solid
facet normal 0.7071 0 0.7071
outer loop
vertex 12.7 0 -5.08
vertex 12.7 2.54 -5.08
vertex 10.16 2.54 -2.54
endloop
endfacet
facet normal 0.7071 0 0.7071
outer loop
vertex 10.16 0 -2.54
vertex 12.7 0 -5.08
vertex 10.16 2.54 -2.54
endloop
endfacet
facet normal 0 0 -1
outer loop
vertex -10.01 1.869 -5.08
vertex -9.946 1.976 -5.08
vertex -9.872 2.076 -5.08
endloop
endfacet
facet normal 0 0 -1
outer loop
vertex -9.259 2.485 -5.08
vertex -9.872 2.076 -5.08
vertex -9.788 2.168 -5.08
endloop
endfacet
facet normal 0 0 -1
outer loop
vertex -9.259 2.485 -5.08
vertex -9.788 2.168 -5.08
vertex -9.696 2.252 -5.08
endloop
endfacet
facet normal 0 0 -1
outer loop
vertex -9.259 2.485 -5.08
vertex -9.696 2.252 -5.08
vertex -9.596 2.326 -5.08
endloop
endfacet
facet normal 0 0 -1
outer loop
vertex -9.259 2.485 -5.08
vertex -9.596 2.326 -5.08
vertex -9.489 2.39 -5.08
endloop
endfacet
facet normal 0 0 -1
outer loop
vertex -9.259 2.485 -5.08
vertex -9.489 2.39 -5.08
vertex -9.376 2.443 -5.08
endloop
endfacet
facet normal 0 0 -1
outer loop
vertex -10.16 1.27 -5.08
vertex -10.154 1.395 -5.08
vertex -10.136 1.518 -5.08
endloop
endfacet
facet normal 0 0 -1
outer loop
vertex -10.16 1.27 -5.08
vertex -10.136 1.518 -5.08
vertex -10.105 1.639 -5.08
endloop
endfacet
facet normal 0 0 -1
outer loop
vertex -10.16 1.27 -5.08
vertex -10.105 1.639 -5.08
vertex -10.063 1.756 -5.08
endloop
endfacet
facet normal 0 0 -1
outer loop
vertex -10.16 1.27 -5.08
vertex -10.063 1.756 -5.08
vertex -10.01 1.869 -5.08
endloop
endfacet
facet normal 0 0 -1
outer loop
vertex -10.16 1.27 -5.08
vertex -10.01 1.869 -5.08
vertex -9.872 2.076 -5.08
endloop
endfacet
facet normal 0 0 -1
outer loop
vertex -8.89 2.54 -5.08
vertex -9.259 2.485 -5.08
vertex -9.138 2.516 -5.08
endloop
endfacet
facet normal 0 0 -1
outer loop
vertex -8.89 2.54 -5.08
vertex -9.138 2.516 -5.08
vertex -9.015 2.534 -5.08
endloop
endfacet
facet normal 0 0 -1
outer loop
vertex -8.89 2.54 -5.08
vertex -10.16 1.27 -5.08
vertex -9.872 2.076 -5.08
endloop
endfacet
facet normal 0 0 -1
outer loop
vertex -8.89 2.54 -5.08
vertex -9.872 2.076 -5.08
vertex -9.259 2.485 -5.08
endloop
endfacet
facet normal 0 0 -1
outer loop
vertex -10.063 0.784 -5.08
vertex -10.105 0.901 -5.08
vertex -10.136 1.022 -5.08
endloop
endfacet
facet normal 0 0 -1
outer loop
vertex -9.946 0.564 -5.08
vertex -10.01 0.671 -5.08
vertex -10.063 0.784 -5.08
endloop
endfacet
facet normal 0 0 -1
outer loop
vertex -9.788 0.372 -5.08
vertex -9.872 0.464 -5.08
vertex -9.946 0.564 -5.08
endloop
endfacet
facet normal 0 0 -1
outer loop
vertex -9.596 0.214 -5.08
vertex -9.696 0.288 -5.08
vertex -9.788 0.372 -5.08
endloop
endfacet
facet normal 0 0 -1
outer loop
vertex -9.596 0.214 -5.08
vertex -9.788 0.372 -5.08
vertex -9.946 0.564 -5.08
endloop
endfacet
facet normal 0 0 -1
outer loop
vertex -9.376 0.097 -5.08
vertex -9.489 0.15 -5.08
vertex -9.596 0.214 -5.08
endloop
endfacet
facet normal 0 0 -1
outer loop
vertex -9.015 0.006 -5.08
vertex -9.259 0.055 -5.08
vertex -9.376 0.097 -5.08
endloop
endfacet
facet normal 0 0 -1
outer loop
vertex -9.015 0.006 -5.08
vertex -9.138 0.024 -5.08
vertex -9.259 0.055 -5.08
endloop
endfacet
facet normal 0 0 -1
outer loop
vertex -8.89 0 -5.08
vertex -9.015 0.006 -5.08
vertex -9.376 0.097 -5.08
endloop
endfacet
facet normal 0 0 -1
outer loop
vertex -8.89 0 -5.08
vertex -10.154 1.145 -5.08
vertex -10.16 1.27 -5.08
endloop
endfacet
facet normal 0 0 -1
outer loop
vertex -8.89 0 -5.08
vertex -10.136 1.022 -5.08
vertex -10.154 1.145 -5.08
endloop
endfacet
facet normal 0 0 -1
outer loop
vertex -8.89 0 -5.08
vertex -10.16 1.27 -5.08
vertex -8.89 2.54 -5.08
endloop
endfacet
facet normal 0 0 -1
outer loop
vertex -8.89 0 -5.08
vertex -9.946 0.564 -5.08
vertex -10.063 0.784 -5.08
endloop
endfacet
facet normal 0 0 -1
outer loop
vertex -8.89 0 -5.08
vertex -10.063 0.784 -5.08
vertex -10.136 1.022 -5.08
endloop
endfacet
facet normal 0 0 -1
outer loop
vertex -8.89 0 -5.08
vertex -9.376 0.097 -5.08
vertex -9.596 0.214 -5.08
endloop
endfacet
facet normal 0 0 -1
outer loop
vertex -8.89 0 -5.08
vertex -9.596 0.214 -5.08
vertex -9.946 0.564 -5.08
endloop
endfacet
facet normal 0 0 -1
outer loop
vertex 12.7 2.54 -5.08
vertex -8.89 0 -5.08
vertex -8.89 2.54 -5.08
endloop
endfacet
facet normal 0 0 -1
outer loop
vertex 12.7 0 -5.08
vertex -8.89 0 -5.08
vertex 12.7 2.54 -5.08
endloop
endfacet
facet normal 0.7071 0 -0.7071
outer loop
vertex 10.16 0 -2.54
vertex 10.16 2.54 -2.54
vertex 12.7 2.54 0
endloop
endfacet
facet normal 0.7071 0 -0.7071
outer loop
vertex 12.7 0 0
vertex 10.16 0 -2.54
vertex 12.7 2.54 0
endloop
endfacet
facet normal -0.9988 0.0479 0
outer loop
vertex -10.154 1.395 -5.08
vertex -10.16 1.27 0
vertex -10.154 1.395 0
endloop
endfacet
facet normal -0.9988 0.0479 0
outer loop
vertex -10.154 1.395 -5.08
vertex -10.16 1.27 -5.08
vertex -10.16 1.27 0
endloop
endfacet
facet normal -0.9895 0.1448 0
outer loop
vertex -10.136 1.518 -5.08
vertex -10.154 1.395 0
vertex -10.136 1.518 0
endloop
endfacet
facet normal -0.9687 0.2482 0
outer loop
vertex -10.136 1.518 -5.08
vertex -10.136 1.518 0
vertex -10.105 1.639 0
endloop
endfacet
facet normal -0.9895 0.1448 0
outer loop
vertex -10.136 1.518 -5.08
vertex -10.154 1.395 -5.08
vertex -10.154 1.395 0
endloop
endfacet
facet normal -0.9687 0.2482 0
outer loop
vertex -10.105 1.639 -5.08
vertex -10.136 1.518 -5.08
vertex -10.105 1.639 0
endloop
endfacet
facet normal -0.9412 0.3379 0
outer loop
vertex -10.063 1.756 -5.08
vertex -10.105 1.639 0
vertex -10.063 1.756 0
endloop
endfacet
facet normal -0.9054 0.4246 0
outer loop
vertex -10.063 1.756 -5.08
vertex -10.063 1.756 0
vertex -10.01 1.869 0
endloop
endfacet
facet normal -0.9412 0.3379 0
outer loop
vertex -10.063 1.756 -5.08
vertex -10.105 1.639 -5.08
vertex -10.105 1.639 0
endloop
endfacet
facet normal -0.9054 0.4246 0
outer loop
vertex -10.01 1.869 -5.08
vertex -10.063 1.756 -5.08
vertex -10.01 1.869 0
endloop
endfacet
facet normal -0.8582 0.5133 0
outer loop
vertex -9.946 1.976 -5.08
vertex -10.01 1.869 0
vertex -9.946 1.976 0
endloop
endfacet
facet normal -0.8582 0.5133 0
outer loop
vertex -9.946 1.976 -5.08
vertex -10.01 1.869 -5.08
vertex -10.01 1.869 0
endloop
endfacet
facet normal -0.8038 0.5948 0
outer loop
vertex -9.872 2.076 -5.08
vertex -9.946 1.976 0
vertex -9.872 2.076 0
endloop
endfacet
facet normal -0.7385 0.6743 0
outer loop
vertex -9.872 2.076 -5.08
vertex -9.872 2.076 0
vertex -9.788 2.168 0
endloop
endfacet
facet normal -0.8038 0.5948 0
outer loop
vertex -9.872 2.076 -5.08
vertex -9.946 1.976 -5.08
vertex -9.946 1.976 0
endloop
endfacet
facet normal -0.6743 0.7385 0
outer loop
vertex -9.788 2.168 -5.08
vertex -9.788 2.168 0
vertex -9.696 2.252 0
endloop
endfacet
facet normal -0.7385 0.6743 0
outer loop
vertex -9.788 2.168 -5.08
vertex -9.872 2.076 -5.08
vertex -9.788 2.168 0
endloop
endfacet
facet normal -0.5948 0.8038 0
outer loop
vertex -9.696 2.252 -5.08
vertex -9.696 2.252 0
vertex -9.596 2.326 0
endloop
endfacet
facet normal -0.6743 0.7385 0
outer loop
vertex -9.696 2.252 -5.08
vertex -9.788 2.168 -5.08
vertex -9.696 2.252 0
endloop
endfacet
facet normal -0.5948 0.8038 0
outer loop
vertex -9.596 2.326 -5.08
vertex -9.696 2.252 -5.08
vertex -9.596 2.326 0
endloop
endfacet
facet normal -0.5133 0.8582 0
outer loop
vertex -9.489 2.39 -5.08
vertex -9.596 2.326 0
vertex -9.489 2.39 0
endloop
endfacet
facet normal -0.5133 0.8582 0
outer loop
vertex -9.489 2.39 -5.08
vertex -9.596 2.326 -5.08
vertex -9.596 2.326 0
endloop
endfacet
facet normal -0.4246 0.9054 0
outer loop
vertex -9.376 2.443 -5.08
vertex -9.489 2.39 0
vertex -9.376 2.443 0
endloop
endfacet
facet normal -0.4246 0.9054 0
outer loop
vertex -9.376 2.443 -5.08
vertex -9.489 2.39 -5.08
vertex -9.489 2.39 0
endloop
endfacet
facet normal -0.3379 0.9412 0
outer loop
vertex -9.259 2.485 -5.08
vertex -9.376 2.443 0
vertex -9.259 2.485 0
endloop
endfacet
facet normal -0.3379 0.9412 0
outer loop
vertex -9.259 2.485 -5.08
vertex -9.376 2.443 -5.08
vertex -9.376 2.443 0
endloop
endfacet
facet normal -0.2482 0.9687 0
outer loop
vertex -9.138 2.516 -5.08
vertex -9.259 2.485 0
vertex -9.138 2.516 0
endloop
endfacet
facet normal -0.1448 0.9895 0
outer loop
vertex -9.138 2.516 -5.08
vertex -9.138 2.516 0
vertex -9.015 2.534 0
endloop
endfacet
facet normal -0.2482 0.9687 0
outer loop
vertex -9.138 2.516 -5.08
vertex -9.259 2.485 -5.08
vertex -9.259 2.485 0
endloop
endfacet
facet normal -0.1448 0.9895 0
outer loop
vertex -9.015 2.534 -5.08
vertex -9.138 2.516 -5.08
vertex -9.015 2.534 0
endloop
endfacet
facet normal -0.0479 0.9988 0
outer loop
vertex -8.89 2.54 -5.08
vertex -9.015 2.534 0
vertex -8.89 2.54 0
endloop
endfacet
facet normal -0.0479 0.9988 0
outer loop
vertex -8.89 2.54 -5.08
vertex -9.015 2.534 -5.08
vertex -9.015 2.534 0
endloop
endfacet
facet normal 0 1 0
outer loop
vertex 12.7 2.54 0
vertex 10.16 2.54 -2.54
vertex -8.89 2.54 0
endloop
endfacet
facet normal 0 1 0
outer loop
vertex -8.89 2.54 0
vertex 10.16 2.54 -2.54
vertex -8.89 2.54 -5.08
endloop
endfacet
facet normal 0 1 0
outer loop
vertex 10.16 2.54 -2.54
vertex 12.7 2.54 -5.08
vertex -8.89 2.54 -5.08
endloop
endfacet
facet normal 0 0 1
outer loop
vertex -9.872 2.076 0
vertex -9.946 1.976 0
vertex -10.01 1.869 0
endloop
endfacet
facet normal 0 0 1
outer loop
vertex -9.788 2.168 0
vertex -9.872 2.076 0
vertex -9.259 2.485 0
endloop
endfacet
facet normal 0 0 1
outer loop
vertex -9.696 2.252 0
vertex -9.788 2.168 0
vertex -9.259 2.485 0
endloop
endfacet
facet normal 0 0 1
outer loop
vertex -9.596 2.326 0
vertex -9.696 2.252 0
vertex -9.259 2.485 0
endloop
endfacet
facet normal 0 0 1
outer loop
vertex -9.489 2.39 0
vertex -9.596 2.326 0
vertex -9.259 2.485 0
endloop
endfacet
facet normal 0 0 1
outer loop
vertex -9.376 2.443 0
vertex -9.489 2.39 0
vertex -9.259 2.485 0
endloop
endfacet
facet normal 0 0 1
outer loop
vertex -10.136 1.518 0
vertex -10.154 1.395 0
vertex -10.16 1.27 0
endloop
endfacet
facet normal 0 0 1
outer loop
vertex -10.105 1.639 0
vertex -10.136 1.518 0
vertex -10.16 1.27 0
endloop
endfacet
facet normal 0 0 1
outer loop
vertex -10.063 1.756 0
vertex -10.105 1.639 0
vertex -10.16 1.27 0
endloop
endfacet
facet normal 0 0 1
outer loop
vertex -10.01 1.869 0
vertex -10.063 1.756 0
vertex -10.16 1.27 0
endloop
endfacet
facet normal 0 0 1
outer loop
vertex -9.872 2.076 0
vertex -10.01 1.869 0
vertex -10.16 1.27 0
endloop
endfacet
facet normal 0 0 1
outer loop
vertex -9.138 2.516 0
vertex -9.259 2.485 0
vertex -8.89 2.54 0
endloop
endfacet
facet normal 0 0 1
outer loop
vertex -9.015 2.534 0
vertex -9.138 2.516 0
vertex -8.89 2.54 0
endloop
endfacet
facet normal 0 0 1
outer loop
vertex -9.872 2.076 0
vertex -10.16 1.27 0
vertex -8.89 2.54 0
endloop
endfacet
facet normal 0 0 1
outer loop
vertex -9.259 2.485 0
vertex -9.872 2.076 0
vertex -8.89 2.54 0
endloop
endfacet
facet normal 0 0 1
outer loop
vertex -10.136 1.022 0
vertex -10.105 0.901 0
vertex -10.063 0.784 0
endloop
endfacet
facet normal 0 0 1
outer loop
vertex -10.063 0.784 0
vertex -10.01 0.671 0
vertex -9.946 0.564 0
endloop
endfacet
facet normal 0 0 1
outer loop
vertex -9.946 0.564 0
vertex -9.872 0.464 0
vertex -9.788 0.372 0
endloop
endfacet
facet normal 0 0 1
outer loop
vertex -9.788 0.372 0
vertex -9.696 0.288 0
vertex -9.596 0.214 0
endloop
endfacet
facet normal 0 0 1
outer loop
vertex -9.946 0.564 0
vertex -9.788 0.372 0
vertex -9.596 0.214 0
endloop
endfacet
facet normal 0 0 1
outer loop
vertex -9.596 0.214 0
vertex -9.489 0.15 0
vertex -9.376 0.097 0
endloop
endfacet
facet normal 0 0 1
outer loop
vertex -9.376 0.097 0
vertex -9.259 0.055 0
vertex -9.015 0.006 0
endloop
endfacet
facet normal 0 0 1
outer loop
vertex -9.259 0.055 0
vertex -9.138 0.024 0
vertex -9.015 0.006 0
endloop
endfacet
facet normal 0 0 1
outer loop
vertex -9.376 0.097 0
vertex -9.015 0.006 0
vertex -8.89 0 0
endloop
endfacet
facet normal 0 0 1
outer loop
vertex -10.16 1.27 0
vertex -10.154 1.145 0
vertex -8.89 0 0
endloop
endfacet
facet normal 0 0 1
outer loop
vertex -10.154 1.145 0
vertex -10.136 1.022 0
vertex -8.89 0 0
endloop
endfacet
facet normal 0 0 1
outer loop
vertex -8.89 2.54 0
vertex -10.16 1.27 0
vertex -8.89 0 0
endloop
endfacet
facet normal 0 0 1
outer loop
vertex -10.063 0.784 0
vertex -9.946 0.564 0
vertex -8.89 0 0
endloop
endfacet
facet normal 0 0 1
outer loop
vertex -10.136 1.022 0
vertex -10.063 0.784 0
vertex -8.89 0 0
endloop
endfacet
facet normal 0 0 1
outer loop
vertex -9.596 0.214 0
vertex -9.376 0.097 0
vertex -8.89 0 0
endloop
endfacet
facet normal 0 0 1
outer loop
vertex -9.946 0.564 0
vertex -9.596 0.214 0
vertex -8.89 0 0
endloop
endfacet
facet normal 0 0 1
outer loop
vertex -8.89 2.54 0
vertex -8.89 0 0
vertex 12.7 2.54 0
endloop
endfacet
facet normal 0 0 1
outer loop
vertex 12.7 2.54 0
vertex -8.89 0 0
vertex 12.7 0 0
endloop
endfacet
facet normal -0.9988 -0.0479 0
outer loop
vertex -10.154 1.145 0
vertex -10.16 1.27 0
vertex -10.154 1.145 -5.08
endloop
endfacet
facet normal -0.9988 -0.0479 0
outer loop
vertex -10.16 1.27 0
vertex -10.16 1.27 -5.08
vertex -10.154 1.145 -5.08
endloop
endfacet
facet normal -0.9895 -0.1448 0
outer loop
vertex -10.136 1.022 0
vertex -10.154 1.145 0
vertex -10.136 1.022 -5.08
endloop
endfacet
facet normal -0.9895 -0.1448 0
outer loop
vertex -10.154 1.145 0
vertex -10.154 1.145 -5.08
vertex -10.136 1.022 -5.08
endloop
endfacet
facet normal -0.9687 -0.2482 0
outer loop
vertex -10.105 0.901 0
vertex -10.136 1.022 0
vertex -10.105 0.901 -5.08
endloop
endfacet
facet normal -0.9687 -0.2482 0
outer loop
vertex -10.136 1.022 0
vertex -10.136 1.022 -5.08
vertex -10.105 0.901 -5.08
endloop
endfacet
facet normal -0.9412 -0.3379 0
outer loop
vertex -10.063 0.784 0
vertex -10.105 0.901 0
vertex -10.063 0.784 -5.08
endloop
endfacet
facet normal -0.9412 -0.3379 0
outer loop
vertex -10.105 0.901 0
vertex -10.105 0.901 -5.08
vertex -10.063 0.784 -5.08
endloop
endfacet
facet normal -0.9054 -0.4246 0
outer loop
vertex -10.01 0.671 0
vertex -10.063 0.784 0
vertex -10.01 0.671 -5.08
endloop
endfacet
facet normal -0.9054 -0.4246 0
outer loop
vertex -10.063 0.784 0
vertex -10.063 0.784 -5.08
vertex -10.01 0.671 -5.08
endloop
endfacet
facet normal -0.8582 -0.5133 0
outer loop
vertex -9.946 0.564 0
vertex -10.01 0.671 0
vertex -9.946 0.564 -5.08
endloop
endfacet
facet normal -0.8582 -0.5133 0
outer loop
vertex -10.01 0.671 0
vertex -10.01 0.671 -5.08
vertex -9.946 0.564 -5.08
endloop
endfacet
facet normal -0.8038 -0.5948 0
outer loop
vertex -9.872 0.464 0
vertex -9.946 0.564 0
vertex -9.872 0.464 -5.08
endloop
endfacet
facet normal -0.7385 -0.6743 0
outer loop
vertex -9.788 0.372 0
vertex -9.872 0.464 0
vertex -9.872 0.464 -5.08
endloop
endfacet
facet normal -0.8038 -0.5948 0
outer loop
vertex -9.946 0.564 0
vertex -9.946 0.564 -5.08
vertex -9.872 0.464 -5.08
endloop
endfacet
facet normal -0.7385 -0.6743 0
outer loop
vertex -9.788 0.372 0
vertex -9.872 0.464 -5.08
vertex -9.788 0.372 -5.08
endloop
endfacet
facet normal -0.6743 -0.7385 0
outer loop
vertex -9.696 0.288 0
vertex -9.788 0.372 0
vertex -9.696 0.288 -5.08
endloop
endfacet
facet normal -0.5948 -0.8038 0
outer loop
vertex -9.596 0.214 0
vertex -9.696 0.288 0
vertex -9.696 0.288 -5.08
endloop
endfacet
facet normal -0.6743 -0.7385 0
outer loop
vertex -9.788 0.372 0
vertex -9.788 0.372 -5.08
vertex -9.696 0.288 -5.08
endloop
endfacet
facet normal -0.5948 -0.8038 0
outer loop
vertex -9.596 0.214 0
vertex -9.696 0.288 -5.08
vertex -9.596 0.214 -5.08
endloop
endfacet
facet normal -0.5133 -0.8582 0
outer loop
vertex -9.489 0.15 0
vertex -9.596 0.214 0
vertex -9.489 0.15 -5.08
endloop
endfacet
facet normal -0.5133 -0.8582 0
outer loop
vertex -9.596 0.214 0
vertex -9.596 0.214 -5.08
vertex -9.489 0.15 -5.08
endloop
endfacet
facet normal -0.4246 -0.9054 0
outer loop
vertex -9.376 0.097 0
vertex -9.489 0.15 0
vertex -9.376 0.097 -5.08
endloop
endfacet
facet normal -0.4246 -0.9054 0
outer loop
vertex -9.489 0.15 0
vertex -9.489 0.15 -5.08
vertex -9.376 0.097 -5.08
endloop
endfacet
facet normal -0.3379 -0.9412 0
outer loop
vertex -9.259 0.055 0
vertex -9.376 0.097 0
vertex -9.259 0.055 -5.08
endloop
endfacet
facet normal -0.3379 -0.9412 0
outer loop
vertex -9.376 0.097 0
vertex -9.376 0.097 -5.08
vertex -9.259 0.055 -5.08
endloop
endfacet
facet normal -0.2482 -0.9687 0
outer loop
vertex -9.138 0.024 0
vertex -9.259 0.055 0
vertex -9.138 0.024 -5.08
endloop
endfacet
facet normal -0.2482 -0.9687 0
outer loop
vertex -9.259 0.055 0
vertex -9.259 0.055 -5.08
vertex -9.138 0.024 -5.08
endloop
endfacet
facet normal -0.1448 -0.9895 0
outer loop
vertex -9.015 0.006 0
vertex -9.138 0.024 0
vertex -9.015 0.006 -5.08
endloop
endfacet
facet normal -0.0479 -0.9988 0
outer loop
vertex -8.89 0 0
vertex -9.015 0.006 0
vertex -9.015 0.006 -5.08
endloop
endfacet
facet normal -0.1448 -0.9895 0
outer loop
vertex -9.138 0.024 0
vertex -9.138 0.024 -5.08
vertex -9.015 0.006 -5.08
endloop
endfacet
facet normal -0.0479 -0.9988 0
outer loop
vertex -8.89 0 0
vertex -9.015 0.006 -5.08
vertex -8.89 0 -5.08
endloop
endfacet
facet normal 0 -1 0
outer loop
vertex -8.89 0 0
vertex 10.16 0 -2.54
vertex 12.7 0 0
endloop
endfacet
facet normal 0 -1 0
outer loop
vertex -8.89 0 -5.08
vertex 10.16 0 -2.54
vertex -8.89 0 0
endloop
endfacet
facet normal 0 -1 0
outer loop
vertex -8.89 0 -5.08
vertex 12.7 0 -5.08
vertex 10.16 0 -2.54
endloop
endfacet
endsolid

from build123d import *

# Parameters (mm, degrees)
BOSS_EXTRUDE1_DEPTH = 2.54
FILLET1_R           = 1.27
CUT_EXTRUDE2_DEPTH  = 2.54


with BuildPart() as part:
    # Sketch1 → Boss-Extrude1 (new body)
    with BuildSketch(Plane(origin=(0, 0, 0), x_dir=(1, 0, 0), z_dir=(0, 1, 0))):
        Polygon((12.7, 0), (0, 0), (-10.16, 0), (-10.16, 5.08), (12.7, 5.08), align=None)
    extrude(amount=BOSS_EXTRUDE1_DEPTH)

    # Fillet1
    fillet1_edges = [part.edges().sort_by_distance(p)[0] for p in [
        (-10.16, 0, -2.54),
        (-10.16, 2.54, -2.54),
    ]]
    fillet(fillet1_edges, radius=FILLET1_R - 0.0001)  # a hair under: the kernel refuses the full size

    # Sketch3 → Cut-Extrude2 (cut)
    with BuildSketch(Plane(origin=(0, 2.54, 0), x_dir=(1, 0, 0), z_dir=(0, 1, 0))):
        Polygon((12.7, 5.08), (10.16, 2.54), (12.7, 0), align=None)
    extrude(amount=-CUT_EXTRUDE2_DEPTH, mode=Mode.SUBTRACT)


solid = part.part
